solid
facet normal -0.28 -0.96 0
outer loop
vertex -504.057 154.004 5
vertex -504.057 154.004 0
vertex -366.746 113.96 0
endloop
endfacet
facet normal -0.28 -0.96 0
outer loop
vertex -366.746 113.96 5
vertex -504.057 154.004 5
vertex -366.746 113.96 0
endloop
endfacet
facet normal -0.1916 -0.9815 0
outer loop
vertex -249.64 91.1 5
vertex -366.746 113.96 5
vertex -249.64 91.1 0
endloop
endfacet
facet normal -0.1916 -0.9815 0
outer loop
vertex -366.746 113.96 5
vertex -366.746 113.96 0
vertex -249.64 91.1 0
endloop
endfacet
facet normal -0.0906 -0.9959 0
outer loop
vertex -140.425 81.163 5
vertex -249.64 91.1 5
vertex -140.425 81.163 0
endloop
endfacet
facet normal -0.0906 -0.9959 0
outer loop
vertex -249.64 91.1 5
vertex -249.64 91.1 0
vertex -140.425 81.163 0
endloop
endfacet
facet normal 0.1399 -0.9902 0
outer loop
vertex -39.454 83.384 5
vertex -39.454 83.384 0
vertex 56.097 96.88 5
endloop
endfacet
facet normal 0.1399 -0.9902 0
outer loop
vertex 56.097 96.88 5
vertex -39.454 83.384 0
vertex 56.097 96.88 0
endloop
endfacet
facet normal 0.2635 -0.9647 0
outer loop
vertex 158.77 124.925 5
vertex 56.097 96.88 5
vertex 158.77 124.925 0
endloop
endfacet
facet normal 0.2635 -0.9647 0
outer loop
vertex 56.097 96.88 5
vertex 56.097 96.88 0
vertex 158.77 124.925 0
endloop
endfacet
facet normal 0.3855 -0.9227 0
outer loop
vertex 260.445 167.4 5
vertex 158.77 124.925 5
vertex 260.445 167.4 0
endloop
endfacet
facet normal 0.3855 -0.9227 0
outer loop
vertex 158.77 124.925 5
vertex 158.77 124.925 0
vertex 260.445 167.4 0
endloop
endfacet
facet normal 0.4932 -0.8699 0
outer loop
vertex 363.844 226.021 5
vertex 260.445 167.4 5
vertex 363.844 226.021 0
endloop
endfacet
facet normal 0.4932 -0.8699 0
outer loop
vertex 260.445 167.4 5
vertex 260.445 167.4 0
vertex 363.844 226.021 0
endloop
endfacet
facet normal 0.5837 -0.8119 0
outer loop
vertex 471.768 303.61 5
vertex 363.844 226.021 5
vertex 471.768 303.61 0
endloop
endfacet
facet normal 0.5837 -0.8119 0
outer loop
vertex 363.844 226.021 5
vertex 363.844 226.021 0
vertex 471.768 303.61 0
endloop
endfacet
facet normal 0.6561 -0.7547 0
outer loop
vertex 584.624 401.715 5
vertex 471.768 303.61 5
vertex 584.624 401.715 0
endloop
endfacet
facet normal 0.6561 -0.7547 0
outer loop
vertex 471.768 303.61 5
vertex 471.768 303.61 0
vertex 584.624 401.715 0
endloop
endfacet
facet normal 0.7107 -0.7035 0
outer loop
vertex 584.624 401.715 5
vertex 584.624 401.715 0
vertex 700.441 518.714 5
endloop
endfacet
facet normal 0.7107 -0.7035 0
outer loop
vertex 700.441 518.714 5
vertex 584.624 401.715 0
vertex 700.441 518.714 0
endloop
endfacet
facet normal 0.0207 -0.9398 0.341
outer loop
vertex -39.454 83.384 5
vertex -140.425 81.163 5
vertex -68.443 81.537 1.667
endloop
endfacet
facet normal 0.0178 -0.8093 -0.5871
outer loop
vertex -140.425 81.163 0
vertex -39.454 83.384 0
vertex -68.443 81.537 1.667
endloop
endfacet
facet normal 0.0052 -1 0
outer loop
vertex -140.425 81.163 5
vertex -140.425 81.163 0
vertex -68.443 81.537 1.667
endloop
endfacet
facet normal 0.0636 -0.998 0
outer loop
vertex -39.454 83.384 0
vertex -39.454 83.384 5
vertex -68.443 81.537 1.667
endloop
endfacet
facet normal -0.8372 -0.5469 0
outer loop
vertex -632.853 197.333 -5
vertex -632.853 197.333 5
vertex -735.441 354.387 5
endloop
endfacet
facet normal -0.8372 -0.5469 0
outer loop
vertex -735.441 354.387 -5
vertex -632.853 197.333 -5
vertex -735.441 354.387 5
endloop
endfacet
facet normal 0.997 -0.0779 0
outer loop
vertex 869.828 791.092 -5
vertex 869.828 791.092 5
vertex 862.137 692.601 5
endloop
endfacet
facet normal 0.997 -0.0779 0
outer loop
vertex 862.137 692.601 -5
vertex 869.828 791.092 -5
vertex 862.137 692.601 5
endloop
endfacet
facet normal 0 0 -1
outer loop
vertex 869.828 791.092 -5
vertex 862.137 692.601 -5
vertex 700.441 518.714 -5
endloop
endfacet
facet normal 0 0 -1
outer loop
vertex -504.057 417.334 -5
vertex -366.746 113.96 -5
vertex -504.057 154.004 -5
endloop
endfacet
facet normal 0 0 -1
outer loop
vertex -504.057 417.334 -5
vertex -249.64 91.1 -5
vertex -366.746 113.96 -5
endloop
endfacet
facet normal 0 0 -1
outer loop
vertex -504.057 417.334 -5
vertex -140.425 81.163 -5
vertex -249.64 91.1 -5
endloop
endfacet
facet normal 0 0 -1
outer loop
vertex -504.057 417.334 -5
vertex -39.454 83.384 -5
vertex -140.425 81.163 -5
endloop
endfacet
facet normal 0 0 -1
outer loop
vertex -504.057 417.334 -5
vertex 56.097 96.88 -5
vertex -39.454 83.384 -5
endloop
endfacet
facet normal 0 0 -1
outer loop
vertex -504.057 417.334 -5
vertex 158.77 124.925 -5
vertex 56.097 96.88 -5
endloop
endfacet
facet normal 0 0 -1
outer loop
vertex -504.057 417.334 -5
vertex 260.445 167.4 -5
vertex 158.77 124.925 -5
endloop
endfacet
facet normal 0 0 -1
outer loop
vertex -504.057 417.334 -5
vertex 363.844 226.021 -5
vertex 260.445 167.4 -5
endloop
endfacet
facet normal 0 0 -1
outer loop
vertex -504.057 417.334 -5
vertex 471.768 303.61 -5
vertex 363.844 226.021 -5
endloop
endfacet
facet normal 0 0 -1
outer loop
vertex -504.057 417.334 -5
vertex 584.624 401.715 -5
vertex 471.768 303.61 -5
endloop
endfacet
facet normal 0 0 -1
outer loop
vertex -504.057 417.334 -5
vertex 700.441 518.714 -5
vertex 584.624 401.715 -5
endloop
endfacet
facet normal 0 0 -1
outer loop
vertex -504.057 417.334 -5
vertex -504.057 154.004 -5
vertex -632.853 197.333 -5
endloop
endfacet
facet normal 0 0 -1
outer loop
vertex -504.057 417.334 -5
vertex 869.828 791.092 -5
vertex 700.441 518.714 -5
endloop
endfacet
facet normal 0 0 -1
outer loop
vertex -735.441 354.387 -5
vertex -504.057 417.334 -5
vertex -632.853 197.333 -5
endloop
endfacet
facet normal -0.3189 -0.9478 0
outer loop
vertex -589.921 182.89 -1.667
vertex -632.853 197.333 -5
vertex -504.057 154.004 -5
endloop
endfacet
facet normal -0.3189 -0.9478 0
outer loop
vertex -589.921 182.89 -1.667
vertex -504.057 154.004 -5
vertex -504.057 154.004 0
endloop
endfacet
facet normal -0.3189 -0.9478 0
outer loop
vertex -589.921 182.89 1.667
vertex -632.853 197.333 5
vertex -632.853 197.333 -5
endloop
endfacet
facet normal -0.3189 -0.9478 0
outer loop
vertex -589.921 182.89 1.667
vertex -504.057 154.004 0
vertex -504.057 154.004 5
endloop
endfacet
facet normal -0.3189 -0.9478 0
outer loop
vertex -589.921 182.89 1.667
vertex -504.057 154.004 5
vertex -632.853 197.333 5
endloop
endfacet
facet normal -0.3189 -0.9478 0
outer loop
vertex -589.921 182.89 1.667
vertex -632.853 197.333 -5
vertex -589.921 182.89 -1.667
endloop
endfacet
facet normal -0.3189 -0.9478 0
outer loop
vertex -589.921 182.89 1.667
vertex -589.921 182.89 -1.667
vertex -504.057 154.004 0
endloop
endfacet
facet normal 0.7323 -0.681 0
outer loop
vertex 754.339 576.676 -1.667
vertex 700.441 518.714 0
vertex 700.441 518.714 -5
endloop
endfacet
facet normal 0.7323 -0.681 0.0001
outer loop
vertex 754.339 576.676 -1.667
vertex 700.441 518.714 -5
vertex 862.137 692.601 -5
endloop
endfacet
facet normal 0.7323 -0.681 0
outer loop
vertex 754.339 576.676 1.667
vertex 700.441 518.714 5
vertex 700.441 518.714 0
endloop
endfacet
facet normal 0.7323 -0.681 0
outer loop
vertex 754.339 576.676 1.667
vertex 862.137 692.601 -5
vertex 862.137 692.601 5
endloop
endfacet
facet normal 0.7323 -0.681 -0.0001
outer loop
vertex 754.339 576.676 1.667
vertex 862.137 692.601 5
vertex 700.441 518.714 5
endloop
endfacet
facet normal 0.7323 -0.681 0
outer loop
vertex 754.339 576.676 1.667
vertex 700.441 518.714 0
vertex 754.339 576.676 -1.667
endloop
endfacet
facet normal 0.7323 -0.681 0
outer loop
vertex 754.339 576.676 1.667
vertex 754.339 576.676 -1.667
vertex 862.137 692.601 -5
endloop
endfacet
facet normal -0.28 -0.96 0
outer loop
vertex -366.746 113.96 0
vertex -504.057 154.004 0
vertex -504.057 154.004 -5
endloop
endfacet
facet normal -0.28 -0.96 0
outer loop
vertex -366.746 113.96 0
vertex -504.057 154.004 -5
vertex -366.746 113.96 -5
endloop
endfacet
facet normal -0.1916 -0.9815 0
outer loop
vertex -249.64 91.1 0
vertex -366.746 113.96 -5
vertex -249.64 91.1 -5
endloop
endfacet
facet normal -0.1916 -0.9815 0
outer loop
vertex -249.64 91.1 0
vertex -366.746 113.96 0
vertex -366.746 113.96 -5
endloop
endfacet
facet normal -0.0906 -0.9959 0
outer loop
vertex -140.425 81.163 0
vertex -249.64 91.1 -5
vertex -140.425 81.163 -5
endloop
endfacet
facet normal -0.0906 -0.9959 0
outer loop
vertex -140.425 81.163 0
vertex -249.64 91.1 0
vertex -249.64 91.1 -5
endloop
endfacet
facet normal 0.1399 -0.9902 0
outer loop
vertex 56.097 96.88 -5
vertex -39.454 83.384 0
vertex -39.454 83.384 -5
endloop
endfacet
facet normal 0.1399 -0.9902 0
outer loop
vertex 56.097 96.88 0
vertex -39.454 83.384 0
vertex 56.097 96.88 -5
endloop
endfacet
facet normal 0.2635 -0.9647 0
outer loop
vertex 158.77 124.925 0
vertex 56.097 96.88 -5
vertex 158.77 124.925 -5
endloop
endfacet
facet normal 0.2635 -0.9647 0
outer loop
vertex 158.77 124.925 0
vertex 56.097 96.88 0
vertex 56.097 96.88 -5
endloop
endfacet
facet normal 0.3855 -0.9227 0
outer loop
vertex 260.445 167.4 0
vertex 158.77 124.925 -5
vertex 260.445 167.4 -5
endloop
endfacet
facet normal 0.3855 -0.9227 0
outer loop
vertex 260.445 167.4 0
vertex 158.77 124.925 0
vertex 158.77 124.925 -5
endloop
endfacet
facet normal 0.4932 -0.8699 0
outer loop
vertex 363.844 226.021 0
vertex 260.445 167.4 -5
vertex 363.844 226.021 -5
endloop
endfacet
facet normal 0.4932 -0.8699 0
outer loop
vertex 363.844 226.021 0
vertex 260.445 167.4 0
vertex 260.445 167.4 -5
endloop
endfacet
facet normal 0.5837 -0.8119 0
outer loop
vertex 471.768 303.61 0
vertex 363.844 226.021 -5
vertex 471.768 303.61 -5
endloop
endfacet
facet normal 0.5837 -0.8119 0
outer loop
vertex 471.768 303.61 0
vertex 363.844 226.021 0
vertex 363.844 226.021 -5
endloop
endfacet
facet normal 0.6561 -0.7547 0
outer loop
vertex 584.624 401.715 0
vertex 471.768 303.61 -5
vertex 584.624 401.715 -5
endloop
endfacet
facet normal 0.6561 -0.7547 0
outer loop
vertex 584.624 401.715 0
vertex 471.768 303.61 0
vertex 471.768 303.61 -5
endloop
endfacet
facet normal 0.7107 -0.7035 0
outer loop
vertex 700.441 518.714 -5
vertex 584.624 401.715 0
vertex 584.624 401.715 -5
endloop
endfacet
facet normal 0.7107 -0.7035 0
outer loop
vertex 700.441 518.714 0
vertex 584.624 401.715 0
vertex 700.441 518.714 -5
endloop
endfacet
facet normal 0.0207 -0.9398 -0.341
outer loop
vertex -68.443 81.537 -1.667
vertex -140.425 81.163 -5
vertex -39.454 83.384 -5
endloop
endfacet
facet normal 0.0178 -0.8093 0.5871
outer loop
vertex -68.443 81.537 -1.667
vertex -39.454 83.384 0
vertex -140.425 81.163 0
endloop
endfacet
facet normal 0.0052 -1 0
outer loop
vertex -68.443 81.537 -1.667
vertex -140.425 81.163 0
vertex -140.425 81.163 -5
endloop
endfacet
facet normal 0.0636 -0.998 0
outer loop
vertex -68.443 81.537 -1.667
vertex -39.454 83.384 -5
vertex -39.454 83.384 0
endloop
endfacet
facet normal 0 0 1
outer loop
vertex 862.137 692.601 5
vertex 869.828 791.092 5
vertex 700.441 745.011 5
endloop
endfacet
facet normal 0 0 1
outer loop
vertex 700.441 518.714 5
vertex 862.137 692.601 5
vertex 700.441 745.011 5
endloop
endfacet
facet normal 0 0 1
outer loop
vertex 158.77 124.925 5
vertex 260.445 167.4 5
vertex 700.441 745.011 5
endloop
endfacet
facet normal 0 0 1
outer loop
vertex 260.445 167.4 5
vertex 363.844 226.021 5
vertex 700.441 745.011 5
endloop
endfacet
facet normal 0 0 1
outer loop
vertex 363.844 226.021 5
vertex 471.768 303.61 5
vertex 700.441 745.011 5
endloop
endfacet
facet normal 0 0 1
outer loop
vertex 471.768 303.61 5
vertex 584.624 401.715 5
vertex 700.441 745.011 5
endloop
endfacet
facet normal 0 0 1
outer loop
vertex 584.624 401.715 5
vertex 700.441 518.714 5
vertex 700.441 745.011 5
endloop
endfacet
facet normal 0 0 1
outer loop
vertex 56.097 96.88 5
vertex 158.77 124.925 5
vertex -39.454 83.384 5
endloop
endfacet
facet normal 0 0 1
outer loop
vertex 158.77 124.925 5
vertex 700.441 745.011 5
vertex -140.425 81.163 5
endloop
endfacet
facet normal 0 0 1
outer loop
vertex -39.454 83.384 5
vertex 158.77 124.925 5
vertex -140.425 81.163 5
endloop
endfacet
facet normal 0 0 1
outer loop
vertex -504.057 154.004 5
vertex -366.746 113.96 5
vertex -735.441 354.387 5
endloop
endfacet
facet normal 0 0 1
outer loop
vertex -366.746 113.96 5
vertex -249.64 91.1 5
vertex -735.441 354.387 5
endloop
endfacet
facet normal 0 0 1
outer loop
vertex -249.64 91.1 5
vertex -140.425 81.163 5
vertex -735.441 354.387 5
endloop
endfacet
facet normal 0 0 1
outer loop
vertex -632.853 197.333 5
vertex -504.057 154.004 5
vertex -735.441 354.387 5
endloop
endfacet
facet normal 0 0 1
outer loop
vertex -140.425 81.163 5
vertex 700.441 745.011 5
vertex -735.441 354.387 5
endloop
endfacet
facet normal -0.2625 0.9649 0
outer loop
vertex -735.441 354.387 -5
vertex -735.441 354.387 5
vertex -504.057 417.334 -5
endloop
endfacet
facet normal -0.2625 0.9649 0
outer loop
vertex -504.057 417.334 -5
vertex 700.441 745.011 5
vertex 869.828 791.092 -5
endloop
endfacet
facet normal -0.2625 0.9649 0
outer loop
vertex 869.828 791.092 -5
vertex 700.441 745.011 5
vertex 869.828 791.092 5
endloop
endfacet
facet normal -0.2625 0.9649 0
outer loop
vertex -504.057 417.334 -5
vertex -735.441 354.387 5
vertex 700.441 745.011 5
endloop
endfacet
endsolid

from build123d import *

# Parameters (mm, degrees)
EXTRUDE_1_DEPTH          = 5
CUT_EXTRUDE_1_DEPTH      = 1094.936170742
CUT_EXTRUDE_1_DEPTH_BACK = 1094.936170742
EXTRUDE_START            = -10
EXTRUDE_2_DEPTH          = 10


# Read off the part's stored shape, not the designer's step: Бобышка-Вытянуть2
with BuildPart() as part:
    # Эскиз8 → Бобышка-Вытянуть1 (new, symmetric)
    with BuildSketch(Plane.XY):
        with BuildLine():
            Line((700.44072507, 518.714066318), (700.44072507, 840.270275573))
            Line((700.44072507, 840.270275573), (-504.056787588, 840.270275573))
            Line((-504.056787588, 840.270275573), (-504.056787588, 154.00379042))
            add(Edge.make_bspline(
                [(-504.056787588, 154.00379042), (-26.495808626, -6.657301205), (300.332199959, 88.439706024), (700.44072507, 518.714066318)],
                knots=[0, 0, 0, 0, 1, 1, 1, 1], degree=3))
        make_face()
    extrude(amount=EXTRUDE_1_DEPTH, both=True)

    # Эскиз9 → Вырез-Вытянуть1 (cut, two sides: drawn at the far end of the back side and taken through both)
    with BuildSketch(Plane.XY.offset(-CUT_EXTRUDE_1_DEPTH_BACK)):
        Polygon((-593.261399646, 393.06592095), (813.606139874, 775.797425669), (448.342415586, 1086.649231028), (-713.243753546, 944.095990713), align=None)
    extrude(amount=CUT_EXTRUDE_1_DEPTH + CUT_EXTRUDE_1_DEPTH_BACK, mode=Mode.SUBTRACT)

    # Бобышка-Вытянуть2 outline → Бобышка-Вытянуть2 (add)
    with BuildSketch(Plane(origin=(0, 0, -5), x_dir=(-1, 0, 0), z_dir=(0, 0, -1)).offset(EXTRUDE_START)):
        with BuildLine():
            Line((735.441473343, 354.386520069), (504.056787588, 417.333603899))
            Line((504.056787588, 417.333603899), (504.056787588, 154.00379042))
            add(Edge.make_bspline(
                [(632.852748705, 197.333334963), (589.920761666, 182.890153448), (546.988774627, 168.446971934), (504.056787588, 154.00379042)],
                knots=[-0.08989844, -0.08989844, -0.08989844, -0.08989844, 0, 0, 0, 0], degree=3))
            Line((632.852748705, 197.333334963), (735.441473343, 354.386520069))
        make_face()
        with BuildLine():
            add(Edge.make_bspline(
                [(-700.44072507, 518.714066318), (-754.339405201, 576.676390684), (-808.238085332, 634.63871505), (-862.136765463, 692.601039415)],
                knots=[1, 1, 1, 1, 1.134710152, 1.134710152, 1.134710152, 1.134710152], degree=3))
            Line((-700.44072507, 518.714066318), (-700.44072507, 745.011322306))
            Line((-700.44072507, 745.011322306), (-869.827615138, 791.092205896))
            Line((-869.827615138, 791.092205896), (-862.136765463, 692.601039415))
        make_face()
    extrude(amount=EXTRUDE_2_DEPTH)


solid = part.part
